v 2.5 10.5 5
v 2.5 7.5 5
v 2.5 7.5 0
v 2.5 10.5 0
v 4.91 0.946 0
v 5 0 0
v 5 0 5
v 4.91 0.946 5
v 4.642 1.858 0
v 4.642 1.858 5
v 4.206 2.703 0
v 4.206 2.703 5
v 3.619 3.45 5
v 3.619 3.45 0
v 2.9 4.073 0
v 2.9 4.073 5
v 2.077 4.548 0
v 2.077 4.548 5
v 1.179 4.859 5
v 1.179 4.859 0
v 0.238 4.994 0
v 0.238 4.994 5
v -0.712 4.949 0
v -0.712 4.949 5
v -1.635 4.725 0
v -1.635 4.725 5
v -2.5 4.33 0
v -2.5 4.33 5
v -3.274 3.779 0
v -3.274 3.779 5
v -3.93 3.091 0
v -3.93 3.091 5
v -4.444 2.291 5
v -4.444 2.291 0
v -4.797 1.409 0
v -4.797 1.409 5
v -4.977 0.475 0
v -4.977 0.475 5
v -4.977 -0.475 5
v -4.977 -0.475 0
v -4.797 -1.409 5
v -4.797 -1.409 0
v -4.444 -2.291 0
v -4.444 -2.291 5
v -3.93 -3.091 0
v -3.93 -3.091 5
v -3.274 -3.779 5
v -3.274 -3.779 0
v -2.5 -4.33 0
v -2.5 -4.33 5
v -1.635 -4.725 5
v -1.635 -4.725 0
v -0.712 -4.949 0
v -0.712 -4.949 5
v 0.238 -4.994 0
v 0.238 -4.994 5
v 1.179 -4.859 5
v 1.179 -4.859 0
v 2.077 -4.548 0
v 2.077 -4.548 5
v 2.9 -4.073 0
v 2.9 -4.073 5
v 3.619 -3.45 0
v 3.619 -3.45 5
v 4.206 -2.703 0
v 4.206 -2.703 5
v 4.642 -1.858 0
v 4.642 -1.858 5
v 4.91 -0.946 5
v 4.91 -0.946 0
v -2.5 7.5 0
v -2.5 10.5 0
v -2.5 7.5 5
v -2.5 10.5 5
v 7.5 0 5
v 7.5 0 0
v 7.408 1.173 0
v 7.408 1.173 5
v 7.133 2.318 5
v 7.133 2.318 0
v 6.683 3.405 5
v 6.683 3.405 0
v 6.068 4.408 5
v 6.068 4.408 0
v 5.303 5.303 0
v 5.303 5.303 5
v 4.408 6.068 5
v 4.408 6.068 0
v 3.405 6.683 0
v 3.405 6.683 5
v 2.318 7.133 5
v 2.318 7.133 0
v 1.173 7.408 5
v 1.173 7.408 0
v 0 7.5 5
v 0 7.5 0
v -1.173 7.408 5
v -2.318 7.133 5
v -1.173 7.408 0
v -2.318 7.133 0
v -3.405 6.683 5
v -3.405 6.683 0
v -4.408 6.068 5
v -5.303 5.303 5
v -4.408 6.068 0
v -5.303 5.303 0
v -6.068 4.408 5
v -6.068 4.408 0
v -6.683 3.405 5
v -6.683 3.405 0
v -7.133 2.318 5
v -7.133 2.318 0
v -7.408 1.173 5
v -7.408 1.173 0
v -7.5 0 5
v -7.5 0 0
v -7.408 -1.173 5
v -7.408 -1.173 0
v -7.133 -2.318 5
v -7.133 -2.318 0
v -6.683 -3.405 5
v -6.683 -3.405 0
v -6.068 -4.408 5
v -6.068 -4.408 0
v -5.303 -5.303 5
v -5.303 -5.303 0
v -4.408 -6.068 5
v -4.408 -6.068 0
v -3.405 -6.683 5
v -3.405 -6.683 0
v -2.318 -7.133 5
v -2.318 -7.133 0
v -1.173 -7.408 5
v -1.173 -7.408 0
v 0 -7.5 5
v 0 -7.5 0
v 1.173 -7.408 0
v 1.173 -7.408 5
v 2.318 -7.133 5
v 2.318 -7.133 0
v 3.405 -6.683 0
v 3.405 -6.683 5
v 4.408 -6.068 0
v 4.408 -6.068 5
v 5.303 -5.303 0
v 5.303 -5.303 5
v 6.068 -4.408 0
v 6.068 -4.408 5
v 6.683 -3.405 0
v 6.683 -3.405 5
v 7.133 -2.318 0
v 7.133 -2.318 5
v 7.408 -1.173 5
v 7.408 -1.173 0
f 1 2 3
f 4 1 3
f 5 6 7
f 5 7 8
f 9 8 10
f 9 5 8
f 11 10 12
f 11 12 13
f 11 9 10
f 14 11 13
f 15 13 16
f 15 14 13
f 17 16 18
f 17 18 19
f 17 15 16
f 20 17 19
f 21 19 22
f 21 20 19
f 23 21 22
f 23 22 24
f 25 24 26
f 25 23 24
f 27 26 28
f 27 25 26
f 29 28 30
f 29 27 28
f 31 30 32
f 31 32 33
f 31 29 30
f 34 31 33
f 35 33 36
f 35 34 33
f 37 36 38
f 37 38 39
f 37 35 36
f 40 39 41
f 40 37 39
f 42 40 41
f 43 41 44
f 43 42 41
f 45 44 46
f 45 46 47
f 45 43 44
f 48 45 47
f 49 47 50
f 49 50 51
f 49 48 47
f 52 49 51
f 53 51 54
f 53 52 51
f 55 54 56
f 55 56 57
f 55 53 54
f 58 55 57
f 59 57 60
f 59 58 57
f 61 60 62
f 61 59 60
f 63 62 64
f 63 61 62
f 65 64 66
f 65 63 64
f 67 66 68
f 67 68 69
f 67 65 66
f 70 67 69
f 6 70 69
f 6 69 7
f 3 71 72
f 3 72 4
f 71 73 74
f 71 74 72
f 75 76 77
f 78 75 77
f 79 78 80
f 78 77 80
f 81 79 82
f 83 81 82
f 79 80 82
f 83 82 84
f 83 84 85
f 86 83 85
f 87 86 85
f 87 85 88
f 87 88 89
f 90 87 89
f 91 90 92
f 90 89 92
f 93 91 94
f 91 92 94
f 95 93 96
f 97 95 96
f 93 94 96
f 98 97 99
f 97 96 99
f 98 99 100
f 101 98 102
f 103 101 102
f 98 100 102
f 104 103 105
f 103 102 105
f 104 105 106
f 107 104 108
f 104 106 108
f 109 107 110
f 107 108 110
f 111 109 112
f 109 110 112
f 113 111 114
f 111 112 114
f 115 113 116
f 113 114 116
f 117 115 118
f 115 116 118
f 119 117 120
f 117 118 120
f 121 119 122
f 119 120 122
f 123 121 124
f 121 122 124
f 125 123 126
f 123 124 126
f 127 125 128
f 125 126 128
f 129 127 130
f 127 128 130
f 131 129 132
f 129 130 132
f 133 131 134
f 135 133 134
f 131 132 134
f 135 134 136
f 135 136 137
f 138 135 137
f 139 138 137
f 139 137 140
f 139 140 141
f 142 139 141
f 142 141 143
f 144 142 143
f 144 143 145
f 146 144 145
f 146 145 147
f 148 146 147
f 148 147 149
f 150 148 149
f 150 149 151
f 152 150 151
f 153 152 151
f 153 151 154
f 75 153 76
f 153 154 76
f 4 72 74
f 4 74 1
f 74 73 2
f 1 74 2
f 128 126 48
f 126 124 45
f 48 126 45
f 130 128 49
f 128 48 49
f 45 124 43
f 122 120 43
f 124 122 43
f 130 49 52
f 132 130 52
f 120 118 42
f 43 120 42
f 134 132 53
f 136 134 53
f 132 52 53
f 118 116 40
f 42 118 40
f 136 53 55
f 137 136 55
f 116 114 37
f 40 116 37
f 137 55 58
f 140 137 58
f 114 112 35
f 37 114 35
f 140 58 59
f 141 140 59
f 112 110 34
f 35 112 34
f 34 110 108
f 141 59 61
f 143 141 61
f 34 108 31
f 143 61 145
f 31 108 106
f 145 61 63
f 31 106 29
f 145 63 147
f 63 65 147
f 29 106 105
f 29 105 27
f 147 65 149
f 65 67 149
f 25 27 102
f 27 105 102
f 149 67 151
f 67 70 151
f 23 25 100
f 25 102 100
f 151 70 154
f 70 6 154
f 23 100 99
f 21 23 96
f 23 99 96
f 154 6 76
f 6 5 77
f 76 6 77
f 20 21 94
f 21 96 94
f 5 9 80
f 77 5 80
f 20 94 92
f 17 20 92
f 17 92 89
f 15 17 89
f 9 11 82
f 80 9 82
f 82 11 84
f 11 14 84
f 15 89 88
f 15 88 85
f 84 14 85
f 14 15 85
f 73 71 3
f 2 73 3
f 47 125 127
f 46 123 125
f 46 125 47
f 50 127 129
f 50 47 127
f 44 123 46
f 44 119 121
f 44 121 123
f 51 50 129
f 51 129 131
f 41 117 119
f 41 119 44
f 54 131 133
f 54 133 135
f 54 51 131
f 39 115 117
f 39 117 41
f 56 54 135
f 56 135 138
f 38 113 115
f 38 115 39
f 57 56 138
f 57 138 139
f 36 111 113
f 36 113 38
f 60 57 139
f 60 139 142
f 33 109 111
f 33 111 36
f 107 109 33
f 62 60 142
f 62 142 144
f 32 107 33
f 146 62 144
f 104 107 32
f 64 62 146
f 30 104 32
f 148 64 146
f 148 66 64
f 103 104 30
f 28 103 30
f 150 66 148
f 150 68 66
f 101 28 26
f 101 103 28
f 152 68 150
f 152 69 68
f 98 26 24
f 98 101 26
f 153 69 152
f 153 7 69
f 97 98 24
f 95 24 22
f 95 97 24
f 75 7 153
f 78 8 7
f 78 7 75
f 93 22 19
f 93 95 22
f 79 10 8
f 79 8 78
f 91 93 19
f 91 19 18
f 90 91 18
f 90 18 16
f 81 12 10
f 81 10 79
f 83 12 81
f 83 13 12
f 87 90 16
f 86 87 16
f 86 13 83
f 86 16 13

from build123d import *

# Parameters (mm, degrees)
SKETCH1_R           = 7.5
SKETCH1_R_2         = 5
BOSS_EXTRUDE1_DEPTH = 5
SKETCH2_W           = 5
SKETCH2_H           = 5
BOSS_EXTRUDE2_DEPTH = 3


with BuildPart() as part:
    # Sketch1 → Boss-Extrude1 (new body)
    with BuildSketch(Plane.XY):
        Circle(SKETCH1_R)
        Circle(SKETCH1_R_2, mode=Mode.SUBTRACT)
    extrude(amount=BOSS_EXTRUDE1_DEPTH)


with BuildPart() as body_2:
    # Sketch2 → Boss-Extrude2 (new body)
    with BuildSketch(Plane(origin=(0, 7.5, 0), x_dir=(1, 0, 0), z_dir=(0, 1, 0))):
        with Locations((0, -2.5)):
            Rectangle(SKETCH2_W, SKETCH2_H)
    extrude(amount=BOSS_EXTRUDE2_DEPTH)


solid = Compound([part.part, body_2.part])
